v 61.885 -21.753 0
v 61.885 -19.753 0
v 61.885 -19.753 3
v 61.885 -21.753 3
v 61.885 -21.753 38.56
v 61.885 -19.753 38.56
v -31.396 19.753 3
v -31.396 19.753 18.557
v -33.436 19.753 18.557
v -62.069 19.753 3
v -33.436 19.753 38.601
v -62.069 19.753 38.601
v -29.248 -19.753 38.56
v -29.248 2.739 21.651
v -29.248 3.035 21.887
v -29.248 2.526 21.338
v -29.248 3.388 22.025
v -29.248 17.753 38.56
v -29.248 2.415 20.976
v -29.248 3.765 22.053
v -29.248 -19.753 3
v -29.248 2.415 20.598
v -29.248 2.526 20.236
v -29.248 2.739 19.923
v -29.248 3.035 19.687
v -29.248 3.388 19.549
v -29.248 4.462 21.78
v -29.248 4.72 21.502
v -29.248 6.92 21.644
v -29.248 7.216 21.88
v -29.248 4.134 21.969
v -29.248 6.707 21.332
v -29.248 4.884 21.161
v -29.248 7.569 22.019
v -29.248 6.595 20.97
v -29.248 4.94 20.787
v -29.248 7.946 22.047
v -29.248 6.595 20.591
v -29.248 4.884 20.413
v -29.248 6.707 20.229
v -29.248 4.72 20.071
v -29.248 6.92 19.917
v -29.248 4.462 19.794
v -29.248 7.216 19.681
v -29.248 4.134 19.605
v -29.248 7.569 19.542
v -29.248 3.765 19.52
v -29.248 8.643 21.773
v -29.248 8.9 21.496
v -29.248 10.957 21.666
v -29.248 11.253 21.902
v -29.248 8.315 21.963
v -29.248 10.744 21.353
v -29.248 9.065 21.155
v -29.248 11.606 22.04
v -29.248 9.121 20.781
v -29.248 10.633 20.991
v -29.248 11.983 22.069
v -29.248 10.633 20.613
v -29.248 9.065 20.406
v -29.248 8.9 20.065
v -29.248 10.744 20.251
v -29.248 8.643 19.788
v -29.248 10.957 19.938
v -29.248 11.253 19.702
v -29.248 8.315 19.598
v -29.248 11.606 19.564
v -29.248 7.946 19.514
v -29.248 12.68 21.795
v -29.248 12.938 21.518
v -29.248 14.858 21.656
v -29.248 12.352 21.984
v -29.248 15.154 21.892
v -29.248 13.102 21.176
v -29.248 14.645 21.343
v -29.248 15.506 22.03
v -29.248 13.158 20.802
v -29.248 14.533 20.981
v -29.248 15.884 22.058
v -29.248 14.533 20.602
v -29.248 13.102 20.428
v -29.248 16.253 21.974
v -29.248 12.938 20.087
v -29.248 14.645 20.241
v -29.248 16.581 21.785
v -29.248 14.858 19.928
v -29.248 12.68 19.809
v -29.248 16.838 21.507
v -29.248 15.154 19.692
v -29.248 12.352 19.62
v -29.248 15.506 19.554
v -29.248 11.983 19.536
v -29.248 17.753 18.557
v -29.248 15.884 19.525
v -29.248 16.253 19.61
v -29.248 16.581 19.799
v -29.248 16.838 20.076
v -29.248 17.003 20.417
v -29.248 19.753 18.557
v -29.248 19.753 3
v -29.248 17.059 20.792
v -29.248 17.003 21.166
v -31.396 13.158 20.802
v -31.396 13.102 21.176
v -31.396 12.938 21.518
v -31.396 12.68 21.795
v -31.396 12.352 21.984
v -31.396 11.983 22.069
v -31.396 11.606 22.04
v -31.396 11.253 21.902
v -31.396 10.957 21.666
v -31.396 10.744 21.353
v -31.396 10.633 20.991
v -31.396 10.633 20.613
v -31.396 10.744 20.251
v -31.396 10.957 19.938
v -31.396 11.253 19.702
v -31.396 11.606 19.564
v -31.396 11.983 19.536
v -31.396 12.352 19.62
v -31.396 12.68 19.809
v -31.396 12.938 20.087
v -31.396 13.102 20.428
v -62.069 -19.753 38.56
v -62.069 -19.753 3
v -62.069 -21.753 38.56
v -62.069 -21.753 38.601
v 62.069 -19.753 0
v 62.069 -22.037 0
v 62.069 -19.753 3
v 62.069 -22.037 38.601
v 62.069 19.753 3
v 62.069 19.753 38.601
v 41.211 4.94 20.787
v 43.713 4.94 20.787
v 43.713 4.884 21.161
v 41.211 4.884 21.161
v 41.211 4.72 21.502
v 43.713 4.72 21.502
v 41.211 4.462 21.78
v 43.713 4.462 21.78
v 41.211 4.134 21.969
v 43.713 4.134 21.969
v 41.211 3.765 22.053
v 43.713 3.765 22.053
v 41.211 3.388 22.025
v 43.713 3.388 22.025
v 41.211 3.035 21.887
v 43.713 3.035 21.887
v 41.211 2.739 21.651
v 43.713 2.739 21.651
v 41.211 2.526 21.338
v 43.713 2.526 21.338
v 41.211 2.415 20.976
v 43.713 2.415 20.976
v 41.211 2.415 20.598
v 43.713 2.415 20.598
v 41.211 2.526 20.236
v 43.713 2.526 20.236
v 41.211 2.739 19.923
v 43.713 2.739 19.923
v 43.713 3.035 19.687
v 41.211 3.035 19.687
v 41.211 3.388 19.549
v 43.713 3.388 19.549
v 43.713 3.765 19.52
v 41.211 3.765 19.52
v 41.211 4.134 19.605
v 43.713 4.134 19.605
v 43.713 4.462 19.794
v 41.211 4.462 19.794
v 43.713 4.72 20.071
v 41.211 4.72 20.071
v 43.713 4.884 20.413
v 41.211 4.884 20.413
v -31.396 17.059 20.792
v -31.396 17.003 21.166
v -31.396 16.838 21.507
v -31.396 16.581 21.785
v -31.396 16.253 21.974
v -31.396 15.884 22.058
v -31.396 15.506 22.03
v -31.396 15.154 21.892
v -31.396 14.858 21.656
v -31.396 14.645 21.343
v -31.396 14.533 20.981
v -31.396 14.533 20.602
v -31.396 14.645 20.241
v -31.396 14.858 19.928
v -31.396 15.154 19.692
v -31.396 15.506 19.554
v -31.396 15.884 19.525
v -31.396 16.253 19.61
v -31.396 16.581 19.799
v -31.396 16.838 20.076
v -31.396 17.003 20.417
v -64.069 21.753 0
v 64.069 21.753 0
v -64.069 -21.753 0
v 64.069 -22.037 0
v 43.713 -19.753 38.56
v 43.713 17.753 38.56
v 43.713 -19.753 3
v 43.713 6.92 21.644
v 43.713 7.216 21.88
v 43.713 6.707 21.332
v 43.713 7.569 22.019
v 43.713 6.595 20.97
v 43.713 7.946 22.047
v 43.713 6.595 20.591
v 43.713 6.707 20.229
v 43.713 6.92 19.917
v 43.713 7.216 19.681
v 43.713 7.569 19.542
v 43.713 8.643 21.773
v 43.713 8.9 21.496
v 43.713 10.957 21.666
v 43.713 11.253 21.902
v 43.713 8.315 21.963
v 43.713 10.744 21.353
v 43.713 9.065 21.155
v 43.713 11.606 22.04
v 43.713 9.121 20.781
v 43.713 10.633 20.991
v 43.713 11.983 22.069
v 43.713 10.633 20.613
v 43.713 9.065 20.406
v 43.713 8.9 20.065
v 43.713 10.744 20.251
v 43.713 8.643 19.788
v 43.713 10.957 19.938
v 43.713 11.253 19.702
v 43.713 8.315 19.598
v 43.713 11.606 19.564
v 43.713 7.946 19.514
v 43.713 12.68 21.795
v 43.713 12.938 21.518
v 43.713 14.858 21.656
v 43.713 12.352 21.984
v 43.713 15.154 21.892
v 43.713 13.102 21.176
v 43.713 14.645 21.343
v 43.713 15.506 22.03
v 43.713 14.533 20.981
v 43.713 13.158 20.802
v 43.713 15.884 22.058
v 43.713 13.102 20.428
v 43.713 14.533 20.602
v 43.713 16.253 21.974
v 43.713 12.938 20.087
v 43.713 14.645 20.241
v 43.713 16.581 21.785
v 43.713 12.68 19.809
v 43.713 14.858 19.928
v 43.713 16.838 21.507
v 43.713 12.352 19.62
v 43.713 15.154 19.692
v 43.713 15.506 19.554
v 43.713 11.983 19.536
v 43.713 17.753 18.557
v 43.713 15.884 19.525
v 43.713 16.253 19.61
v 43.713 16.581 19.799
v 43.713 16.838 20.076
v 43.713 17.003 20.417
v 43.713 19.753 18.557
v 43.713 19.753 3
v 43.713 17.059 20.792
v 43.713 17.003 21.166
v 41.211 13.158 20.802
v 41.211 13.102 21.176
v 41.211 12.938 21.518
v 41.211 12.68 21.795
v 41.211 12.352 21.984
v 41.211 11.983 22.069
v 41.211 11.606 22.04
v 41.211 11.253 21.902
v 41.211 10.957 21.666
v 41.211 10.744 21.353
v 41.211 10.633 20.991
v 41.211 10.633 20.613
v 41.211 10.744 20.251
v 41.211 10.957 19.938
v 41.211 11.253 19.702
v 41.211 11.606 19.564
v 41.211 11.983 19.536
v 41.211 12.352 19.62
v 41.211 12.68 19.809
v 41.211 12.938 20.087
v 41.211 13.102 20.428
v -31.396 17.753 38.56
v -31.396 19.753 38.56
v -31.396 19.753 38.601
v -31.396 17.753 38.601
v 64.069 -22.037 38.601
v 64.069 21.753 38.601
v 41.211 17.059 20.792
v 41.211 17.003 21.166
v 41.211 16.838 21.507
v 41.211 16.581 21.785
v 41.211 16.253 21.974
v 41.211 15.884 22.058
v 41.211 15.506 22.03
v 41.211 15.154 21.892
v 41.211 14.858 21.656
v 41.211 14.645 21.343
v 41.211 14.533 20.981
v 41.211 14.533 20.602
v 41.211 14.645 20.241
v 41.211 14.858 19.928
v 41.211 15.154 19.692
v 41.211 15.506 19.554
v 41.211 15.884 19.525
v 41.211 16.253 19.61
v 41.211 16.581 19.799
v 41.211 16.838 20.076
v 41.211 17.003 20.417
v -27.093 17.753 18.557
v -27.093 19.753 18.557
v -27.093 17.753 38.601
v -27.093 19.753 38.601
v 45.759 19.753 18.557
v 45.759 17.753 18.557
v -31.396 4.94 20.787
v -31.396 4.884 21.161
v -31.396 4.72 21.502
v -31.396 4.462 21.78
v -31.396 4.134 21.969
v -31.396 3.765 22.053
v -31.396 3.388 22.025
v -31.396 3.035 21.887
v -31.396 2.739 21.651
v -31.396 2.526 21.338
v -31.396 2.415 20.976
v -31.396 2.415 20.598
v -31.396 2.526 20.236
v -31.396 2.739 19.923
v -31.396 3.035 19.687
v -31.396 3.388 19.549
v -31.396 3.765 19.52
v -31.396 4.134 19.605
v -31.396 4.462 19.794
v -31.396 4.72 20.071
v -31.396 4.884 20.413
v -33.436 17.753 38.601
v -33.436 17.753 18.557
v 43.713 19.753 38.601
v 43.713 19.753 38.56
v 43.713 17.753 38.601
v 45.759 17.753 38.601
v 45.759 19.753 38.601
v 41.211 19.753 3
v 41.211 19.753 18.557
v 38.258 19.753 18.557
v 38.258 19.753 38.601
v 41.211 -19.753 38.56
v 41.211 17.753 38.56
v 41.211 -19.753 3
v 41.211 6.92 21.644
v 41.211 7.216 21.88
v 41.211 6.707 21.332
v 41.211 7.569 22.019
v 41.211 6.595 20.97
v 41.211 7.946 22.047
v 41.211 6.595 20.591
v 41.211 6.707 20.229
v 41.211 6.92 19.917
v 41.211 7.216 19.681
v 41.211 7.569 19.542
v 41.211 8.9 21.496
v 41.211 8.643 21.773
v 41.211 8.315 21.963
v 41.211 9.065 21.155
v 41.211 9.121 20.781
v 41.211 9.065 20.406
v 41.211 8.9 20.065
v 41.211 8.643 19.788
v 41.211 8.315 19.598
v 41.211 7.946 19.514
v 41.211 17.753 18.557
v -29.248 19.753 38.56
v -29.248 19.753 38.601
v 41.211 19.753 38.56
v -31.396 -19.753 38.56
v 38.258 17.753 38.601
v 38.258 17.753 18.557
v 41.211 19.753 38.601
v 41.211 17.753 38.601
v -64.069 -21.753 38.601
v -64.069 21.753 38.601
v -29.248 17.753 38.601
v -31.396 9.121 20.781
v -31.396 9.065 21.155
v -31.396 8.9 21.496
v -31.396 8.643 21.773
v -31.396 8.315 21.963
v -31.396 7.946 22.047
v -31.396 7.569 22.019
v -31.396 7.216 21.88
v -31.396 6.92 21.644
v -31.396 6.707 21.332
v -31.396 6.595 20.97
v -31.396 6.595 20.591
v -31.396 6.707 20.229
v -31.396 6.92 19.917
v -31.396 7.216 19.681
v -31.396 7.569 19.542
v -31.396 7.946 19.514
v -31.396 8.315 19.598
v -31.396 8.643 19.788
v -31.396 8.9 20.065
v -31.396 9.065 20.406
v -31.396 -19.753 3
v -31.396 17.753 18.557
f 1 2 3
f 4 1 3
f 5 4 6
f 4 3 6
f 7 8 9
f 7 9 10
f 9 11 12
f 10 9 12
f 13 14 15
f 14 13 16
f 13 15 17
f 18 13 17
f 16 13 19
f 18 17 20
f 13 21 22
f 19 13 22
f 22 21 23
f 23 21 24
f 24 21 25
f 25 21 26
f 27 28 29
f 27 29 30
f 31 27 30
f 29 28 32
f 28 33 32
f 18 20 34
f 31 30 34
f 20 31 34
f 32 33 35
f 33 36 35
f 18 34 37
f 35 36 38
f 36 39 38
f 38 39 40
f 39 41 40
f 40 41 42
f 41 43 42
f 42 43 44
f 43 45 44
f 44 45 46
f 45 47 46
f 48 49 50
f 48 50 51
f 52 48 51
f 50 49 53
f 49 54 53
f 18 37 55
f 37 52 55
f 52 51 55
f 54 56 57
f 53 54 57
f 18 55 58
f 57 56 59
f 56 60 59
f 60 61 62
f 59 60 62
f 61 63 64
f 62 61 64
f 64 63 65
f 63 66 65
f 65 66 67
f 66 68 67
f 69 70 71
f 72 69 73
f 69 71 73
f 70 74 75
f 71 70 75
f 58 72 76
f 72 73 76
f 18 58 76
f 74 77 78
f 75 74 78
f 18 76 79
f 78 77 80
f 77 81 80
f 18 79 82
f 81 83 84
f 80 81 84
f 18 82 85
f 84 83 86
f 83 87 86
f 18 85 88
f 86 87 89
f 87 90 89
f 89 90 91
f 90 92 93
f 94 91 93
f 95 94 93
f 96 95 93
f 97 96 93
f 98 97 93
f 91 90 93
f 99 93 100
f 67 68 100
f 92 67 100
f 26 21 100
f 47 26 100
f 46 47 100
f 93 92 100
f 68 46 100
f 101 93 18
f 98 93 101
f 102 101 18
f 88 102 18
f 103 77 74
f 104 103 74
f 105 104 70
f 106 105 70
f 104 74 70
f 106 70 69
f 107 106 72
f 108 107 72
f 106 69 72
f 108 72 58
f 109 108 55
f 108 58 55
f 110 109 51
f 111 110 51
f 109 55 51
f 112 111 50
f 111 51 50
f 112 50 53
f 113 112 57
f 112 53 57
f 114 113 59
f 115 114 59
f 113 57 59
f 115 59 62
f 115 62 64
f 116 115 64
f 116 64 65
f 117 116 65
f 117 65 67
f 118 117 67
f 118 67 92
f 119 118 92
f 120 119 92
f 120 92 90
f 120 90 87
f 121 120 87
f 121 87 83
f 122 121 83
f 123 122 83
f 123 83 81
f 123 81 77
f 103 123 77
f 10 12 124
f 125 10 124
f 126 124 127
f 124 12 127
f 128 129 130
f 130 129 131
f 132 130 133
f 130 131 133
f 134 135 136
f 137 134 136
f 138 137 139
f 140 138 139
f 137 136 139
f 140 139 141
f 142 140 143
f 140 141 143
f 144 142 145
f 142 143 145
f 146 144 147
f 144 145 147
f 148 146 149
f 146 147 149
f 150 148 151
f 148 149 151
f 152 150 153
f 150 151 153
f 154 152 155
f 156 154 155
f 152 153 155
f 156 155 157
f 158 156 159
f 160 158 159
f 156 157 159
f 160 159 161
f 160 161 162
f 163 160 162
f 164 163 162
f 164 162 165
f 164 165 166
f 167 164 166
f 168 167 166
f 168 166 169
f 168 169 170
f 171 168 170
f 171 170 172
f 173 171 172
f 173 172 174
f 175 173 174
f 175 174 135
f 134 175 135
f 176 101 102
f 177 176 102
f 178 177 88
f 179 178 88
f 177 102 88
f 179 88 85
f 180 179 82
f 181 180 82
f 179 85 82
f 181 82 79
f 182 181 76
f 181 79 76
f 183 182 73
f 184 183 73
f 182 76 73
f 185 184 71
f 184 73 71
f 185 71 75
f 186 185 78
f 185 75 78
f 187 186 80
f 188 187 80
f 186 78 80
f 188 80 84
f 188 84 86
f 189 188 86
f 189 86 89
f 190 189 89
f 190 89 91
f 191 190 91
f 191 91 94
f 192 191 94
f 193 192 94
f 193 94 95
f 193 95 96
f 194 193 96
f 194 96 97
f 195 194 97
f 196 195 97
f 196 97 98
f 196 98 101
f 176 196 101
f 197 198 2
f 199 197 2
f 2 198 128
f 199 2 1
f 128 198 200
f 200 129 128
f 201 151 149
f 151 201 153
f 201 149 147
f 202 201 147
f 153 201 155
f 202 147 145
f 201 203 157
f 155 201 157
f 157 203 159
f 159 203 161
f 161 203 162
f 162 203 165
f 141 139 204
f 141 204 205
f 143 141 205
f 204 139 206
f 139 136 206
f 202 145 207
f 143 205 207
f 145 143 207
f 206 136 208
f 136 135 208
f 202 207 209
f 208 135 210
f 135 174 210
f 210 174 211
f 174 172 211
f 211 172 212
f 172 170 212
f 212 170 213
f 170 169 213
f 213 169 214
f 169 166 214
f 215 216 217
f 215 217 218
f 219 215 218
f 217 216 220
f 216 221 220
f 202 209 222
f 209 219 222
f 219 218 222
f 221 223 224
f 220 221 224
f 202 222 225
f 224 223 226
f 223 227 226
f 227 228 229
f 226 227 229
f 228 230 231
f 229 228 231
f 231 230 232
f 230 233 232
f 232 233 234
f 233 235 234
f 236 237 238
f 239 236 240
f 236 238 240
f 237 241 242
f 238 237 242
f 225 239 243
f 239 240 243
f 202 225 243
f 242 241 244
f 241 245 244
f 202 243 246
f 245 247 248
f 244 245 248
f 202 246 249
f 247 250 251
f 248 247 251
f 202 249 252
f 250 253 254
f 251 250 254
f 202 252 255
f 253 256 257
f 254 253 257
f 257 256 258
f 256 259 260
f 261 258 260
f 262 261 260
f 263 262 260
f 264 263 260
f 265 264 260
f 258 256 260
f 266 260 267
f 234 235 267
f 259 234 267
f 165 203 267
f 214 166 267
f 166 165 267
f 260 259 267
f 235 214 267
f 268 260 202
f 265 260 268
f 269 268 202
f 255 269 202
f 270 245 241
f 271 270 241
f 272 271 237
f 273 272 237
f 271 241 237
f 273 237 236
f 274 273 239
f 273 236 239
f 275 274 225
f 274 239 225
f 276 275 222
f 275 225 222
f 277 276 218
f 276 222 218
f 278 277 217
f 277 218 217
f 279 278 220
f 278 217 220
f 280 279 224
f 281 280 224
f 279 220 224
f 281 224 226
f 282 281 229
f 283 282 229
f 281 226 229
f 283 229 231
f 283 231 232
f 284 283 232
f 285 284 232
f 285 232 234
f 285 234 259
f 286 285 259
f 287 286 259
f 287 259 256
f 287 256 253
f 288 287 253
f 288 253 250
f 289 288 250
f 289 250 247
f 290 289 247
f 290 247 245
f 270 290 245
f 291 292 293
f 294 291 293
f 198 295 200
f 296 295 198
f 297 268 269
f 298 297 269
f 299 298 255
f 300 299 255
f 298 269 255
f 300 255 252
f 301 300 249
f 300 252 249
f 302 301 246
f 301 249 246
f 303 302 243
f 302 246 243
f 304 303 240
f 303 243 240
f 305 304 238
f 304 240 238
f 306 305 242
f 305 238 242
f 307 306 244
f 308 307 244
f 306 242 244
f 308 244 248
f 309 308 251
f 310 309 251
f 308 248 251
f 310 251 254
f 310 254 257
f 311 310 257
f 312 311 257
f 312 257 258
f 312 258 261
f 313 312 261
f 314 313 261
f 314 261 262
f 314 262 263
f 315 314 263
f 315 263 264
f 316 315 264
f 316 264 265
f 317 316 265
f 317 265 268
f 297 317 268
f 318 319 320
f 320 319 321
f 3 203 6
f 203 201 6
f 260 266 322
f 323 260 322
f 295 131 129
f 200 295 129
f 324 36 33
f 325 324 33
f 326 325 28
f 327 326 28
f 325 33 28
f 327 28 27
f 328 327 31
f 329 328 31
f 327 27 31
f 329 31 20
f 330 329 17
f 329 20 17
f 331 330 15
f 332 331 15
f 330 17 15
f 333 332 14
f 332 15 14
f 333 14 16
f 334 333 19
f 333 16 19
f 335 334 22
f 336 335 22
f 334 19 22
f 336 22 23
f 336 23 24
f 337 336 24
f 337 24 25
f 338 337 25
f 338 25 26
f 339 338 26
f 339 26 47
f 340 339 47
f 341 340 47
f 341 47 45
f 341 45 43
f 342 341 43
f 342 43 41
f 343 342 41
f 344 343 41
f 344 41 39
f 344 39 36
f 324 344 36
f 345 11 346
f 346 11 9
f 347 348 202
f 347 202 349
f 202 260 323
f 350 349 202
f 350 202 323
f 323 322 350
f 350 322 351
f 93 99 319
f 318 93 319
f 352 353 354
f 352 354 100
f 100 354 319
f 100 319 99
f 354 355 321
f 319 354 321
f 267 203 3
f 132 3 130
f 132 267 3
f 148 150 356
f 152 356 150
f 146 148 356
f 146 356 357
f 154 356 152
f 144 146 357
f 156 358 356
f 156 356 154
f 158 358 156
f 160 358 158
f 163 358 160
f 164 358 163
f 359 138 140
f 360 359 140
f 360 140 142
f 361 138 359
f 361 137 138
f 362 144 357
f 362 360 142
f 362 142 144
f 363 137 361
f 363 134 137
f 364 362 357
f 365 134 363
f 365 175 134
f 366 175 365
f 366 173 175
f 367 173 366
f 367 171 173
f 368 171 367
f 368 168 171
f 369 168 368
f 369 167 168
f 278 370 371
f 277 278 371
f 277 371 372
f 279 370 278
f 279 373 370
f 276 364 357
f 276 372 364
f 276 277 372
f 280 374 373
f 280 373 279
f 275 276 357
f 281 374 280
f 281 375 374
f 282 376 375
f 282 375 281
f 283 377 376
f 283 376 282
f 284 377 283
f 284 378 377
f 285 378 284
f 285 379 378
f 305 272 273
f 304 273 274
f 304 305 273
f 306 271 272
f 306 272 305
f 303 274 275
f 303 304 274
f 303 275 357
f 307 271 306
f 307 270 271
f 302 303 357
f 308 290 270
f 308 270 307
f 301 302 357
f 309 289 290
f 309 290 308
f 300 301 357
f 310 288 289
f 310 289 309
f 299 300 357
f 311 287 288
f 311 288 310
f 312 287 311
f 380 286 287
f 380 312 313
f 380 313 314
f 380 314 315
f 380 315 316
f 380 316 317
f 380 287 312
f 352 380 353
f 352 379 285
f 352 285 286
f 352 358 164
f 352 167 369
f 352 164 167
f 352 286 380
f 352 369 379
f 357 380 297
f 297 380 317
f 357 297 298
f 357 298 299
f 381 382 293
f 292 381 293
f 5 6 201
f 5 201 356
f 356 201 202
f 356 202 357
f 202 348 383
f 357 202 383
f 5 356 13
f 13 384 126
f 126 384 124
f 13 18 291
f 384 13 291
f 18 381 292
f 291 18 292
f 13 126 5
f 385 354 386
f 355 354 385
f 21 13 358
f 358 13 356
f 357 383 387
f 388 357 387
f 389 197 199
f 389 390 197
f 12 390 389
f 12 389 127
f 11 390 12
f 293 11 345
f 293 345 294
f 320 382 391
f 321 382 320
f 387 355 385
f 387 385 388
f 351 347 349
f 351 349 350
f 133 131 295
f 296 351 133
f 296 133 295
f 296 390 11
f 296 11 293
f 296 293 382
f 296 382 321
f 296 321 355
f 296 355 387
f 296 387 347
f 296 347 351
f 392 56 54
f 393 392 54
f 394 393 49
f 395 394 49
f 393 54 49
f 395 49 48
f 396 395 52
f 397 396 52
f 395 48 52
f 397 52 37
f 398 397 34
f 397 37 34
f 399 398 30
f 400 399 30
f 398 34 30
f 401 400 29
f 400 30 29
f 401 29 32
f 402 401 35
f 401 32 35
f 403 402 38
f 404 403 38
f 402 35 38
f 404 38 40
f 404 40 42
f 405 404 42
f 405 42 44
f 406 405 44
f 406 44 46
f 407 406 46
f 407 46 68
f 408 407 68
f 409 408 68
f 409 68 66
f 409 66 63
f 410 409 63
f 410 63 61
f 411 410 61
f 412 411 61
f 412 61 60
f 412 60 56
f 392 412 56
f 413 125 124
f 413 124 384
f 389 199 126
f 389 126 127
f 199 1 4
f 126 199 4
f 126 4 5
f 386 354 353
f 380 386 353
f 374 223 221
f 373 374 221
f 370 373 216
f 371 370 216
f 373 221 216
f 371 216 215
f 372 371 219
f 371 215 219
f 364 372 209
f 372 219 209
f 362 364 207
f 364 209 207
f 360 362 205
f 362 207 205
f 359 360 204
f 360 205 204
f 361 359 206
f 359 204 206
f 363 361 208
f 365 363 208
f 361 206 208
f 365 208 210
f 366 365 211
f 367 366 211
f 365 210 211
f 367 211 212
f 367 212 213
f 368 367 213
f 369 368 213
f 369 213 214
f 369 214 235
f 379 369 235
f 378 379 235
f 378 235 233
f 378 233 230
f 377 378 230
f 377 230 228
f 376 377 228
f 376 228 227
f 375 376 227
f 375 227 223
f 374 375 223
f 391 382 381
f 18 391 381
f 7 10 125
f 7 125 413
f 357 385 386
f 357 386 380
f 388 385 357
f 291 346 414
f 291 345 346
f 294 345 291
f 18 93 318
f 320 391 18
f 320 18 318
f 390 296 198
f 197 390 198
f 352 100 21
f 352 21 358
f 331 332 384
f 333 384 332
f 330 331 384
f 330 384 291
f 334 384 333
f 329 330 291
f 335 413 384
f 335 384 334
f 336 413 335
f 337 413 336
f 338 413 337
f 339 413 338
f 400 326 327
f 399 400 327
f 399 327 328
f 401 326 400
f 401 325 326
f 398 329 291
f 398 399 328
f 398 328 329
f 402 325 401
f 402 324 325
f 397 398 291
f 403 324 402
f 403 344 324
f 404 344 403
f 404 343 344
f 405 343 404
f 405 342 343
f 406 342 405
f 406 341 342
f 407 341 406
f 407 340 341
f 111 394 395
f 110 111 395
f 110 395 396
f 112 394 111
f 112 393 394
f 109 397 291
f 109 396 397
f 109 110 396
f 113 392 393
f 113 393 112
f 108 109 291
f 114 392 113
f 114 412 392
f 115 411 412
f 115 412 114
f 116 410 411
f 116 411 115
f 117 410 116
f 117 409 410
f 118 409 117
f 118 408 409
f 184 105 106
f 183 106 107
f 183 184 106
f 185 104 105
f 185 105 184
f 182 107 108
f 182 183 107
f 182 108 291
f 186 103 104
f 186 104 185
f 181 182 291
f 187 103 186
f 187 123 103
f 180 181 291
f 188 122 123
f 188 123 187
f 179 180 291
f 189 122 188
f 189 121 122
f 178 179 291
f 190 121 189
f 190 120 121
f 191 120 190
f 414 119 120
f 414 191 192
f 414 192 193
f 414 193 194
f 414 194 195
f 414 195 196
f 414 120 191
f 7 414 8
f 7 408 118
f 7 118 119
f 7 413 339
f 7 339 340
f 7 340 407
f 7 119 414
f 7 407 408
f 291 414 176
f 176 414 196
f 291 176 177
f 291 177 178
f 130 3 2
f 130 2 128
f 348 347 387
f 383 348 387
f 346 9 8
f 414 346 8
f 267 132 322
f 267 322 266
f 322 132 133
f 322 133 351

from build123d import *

# Parameters (mm, degrees)
F0_W      = 124.1378337145
F0_H      = 39.50663656
F1_DEPTH  = 3
F2_W      = 2.5017783046
F2_H      = 39.50663656
F2_W_2    = 2.1480806172
F3_DEPTH  = 17.78
F5_DEPTH  = 17.78
F7_D      = 2.54
F8_W      = 30.6726247072
F8_H      = 35.56
F8_W_2    = 18.1720815599
F8_W_3    = 70.4594738781
F9_DEPTH  = 2
F11_DEPTH = 2
F13_DEPTH = 2
F15_DEPTH = 2
F16_W     = 2.9533728957
F16_H     = 20.0437232852
F16_W_2   = 2.1480806172
F16_H_2   = 20.0032039857
F16_W_3   = 2.0457915962
F17_DEPTH = 2


with BuildPart() as f1:
    # F0 (on Top) → F1 (new body)
    with BuildSketch(Plane.XY):
        Rectangle(F0_W, F0_H)
    extrude(amount=F1_DEPTH)

    # F2 (on face) → F3 (join)
    with BuildSketch(Plane.XY.offset(3)):
        with Locations((42.4621514976, 0)):
            Rectangle(F2_W, F2_H)
        with Locations((-30.3222518414, 0)):
            Rectangle(F2_W_2, F2_H)
    extrude(amount=F3_DEPTH)

    # F5 (add): faces of the model
    f5_faces = [f1.faces().sort_by_distance(p)[0] for p in [
        (-30.3222518414, 0, 20.78),
        (42.4621514976, 0, 20.78),
    ]]
    extrude(f5_faces, amount=F5_DEPTH)

    # F7 (through all)
    with Locations(Plane(origin=(-31.39629215, 0, 0), x_dir=(0, -1, 0), z_dir=(-1, 0, 0))):
        with Locations((-11.8883280084, 20.8021104336), (-15.7889463007, 20.7917392254), (-7.8511117026, 20.7805093378), (-3.6703720689, 20.7868441939)):
            Hole(F7_D / 2)

    # F8 (on face) → F9 (join)
    with BuildSketch(Plane.XZ.offset(19.75331828)):
        Polygon((-62.0689168572, 3), (-62.0689168572, 0), (61.8851222098, 0), (61.8851222098, 3), (43.7130406499, 3), (43.7130406499, 38.56), (41.2112623453, 38.56), (41.2112623453, 3), (-29.2482115328, 3), (-29.2482115328, 38.56), (-31.39629215, 38.56), (-31.39629215, 3), align=None)
        with Locations((-46.7326045036, 20.78)):
            Rectangle(F8_W, F8_H)
        with Locations((52.7990814298, 20.78)):
            Rectangle(F8_W_2, F8_H)
        with Locations((5.9815254062, 20.78)):
            Rectangle(F8_W_3, F8_H)
    extrude(amount=F9_DEPTH)

    # F10 (on face) → F11 (join)
    with BuildSketch(Plane(origin=(0, 19.75331828, 0), x_dir=(-1, 0, 0), z_dir=(0, 1, 0))):
        Polygon((-62.0689168572, 38.6005192995), (-62.0689168572, 3), (-43.7130406499, 3), (-43.7130406499, 38.56), (-41.2112623453, 38.56), (-41.2112623453, 3), (29.2482115328, 3), (29.2482115328, 38.56), (31.39629215, 38.56), (31.39629215, 3), (62.0689168572, 3), (62.0689168572, 38.6005192995), align=None)
        Polygon((-62.0689168572, 3), (-62.0689168572, 0), (62.0689168572, 0), (62.0689168572, 3), (31.39629215, 3), (31.39629215, 38.56), (29.2482115328, 38.56), (29.2482115328, 3), (-41.2112623453, 3), (-41.2112623453, 38.56), (-43.7130406499, 38.56), (-43.7130406499, 3), align=None)
    extrude(amount=F11_DEPTH)

    # F12 (on face) → F13 (join)
    with BuildSketch(Plane.YZ.offset(62.0689168572)):
        Polygon((19.75331828, 3), (19.75331828, 38.6005192995), (-22.0371708274, 38.6005192995), (-22.0371708274, 0), (-19.75331828, 0), (-19.75331828, 3), align=None)
        Polygon((21.75331828, 0), (21.75331828, 38.6005192995), (19.75331828, 38.6005192995), (19.75331828, 3), (-19.75331828, 3), (-19.75331828, 0), align=None)
    extrude(amount=F13_DEPTH)

    # F14 (on face) → F15 (join)
    with BuildSketch(Plane(origin=(-62.0689168572, 0, 0), x_dir=(0, -1, 0), z_dir=(-1, 0, 0))):
        Polygon((-21.75331828, 0), (21.75331828, 0), (21.75331828, 38.56), (19.75331828, 38.56), (19.75331828, 3), (-19.75331828, 3), (-19.75331828, 38.6005192995), (-21.75331828, 38.6005192995), align=None)
        Polygon((19.75331828, 38.56), (21.75331828, 38.56), (21.75331828, 38.6005192995), (-19.75331828, 38.6005192995), (-19.75331828, 3), (19.75331828, 3), align=None)
    extrude(amount=F15_DEPTH)

    # F16 (on face) → F17 (join)
    with BuildSketch(Plane.XZ.offset(-19.75331828)):
        with Locations((39.7345758975, 28.5786576569)):
            Rectangle(F16_W, F16_H)
        with Locations((-30.3222518414, 28.5583980072)):
            Rectangle(F16_W_2, F16_H_2)
        Polygon((-33.4356613457, 18.5567960143), (-31.39629215, 18.5567960143), (-31.39629215, 38.56), (-31.39629215, 38.6005192995), (-33.4356613457, 38.6005192995), align=None)
        Polygon((-29.2482115328, 38.56), (-29.2482115328, 18.5567960143), (-27.0928554237, 18.5567960143), (-27.0928554237, 38.6005192995), (-29.2482115328, 38.6005192995), align=None)
        with Locations((44.735936448, 28.5786576569)):
            Rectangle(F16_W_3, F16_H)
    extrude(amount=F17_DEPTH)


solid = f1.part
